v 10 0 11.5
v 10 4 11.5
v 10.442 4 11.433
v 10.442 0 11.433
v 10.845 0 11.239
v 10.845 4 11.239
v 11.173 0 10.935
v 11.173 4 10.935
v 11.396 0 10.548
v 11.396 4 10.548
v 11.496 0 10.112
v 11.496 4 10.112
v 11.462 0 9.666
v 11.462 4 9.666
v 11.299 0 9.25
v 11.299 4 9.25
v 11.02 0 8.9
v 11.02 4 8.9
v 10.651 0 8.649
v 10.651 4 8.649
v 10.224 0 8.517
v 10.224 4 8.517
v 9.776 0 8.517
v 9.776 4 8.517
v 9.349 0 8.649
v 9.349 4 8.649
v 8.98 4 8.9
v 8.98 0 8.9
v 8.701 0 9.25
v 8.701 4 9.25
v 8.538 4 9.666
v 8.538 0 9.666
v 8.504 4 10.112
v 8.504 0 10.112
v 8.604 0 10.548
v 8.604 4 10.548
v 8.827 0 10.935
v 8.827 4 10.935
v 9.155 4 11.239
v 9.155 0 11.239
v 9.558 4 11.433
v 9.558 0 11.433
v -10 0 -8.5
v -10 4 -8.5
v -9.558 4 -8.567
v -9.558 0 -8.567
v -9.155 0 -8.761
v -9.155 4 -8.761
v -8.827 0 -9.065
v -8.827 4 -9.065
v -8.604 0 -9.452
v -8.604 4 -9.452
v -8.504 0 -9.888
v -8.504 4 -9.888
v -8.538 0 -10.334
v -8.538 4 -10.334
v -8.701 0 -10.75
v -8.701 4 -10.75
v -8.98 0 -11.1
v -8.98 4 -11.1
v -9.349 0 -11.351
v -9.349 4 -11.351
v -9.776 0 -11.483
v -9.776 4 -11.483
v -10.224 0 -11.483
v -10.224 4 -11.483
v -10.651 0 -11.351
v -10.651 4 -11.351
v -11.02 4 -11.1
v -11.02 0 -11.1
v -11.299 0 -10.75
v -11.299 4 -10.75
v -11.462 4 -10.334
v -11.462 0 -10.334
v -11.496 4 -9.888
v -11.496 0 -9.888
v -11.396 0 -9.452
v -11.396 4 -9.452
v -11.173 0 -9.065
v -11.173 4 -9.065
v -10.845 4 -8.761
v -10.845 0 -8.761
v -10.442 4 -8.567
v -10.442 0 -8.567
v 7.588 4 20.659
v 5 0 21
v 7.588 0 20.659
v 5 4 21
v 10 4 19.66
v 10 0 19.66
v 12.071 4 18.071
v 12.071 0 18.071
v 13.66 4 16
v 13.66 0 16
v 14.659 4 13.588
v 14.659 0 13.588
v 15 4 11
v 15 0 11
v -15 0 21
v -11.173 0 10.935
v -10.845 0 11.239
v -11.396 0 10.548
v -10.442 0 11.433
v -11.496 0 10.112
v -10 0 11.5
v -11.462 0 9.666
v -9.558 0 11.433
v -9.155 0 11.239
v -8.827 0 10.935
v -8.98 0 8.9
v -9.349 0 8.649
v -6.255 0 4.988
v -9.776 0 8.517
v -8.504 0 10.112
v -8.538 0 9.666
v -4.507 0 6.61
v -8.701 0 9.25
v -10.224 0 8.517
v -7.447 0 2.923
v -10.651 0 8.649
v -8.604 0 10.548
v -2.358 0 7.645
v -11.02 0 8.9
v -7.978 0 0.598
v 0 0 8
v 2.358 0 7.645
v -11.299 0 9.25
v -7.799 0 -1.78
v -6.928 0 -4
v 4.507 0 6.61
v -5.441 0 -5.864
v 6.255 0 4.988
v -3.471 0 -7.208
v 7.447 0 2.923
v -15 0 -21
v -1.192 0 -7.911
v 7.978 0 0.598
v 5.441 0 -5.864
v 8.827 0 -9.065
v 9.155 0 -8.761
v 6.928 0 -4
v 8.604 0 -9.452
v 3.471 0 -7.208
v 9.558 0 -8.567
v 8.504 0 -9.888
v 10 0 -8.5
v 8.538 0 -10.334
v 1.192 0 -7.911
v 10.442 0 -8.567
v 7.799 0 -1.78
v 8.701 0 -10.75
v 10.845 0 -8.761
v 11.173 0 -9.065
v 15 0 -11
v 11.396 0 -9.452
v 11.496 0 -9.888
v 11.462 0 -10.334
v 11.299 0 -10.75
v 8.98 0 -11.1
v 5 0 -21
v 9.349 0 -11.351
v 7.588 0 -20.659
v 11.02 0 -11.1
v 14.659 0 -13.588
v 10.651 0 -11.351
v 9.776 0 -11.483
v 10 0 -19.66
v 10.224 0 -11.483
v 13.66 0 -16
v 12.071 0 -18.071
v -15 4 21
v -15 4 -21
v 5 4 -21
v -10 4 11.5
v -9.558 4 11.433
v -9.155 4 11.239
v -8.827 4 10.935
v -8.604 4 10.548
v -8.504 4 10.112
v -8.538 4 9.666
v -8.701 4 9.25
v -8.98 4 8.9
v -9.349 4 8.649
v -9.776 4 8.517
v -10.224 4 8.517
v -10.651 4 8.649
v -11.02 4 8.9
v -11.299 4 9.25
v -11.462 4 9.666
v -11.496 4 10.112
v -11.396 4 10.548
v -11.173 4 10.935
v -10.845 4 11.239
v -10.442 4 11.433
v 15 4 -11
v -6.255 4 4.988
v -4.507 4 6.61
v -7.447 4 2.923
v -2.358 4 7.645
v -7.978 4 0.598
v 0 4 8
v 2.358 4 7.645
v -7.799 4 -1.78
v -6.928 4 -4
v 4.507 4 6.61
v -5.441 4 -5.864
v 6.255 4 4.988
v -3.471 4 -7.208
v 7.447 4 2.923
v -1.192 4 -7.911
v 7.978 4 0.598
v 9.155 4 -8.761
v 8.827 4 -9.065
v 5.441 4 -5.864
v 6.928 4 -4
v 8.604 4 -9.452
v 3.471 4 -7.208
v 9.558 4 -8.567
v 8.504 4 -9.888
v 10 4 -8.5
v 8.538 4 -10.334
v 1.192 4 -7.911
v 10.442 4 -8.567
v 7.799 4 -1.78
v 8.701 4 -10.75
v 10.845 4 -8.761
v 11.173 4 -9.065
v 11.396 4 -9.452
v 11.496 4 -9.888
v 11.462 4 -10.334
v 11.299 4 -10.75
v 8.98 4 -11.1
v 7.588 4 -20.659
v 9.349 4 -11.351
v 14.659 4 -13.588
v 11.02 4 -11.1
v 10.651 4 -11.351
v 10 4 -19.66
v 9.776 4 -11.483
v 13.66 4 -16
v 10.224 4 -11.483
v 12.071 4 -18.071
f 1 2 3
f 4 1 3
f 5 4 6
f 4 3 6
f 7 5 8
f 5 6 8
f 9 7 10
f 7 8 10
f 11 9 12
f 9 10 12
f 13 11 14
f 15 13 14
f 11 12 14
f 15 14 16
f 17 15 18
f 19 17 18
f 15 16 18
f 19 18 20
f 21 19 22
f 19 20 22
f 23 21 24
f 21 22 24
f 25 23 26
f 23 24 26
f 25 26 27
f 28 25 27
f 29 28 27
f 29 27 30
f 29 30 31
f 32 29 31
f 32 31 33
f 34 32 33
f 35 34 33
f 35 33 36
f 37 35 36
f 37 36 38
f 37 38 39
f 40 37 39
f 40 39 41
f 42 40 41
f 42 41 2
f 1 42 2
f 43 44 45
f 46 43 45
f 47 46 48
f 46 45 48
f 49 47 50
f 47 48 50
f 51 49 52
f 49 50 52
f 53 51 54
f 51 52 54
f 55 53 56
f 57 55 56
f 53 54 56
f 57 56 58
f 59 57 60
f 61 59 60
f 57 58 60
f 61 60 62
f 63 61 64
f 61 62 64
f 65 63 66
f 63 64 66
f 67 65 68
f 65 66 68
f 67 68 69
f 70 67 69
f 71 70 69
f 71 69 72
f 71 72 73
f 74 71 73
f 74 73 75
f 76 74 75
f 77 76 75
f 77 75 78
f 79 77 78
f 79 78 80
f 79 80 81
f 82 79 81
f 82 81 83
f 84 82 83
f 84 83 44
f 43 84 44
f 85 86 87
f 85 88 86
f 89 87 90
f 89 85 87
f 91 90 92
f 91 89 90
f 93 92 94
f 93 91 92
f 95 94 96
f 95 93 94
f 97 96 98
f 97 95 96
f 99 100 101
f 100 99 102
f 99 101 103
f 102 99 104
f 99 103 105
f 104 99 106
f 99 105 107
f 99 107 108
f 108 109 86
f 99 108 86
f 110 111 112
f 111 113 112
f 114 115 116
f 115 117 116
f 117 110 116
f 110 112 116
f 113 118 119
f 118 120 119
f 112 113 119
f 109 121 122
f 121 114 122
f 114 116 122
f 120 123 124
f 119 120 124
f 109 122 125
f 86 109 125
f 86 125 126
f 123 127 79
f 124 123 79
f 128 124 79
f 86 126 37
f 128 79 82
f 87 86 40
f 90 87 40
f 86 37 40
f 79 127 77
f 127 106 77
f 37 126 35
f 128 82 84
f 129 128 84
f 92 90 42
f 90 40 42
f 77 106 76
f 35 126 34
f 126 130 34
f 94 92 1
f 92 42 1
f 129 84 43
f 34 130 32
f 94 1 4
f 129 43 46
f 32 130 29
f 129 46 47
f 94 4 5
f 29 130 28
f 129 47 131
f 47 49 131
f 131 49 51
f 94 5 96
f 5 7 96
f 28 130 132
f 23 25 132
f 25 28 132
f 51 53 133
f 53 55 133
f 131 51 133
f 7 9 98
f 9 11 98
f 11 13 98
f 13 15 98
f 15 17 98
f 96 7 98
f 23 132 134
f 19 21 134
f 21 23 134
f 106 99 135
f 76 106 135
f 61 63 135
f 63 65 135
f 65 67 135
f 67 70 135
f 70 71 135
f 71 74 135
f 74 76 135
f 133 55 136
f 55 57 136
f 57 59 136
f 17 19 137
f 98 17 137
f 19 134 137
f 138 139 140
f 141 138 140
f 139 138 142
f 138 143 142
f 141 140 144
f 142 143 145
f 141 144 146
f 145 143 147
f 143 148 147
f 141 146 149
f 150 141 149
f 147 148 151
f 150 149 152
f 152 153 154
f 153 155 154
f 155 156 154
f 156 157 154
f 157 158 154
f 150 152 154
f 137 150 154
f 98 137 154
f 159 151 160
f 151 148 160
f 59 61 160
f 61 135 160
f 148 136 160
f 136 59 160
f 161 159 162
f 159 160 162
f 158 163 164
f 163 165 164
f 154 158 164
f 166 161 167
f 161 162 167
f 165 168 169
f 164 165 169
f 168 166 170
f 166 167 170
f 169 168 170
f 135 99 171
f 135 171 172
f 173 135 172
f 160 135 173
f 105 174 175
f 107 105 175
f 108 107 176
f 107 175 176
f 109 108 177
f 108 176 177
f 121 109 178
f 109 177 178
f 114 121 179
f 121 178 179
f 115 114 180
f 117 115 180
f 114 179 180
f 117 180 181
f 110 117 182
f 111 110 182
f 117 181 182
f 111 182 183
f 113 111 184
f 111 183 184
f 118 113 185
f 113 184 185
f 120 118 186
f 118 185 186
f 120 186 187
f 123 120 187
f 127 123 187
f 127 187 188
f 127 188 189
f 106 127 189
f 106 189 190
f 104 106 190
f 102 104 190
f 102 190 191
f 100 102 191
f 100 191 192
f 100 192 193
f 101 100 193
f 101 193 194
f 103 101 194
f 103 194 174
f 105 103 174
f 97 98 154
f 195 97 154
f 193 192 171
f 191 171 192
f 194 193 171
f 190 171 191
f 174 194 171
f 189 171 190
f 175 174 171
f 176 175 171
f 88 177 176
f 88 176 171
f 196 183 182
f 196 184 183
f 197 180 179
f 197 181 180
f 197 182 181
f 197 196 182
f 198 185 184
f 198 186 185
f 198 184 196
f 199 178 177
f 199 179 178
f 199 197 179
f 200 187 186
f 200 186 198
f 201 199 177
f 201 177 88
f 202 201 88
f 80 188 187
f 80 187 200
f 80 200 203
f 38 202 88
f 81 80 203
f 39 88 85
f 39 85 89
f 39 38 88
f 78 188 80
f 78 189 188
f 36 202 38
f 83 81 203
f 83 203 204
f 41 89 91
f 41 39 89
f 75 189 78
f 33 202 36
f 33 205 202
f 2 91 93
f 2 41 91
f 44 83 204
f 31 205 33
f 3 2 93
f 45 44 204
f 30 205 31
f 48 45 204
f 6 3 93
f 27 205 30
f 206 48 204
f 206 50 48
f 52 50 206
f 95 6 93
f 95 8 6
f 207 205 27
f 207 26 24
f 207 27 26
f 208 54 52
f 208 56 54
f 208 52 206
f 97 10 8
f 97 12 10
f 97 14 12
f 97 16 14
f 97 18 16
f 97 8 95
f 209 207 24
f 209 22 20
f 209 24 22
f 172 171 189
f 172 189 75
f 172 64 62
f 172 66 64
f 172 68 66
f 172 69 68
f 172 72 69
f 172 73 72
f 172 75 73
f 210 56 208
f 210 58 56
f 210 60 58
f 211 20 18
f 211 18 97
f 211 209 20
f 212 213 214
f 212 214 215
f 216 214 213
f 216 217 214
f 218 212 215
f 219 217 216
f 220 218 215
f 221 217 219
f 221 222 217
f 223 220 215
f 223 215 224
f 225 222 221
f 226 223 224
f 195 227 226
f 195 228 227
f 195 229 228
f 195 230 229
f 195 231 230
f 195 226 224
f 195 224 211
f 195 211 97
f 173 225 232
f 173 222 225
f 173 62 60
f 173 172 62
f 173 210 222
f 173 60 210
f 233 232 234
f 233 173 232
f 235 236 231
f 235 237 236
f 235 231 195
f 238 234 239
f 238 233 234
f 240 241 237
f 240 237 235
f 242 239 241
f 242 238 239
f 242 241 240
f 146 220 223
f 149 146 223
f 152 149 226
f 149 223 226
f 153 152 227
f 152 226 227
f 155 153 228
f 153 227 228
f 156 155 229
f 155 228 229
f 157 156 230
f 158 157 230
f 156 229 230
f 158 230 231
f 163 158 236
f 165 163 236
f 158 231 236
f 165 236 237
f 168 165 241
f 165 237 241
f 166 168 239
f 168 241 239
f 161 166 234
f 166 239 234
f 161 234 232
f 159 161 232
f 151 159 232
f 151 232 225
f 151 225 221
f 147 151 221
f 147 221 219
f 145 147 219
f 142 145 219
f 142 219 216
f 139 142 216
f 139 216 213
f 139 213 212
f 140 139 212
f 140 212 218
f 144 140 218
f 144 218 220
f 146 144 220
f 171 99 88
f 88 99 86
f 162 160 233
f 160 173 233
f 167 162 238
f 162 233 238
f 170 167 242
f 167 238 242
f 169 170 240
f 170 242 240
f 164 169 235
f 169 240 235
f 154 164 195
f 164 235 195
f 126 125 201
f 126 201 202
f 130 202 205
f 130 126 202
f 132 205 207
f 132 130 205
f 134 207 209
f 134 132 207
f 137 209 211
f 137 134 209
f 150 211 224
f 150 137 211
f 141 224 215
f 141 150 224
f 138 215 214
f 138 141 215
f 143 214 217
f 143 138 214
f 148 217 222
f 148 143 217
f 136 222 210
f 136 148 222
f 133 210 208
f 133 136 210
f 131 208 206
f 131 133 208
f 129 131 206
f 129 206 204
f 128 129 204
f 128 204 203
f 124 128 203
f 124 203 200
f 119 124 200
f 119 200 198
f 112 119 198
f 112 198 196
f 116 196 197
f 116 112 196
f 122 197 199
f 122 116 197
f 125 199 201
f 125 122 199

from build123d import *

# Parameters (mm, degrees)
SKETCH2_W           = 30
SKETCH2_H           = 42
SKETCH2_R           = 8
BOSS_EXTRUDE1_DEPTH = 4
FILLET1_R           = 10
SKETCH3_R           = 1.5
CUT_EXTRUDE1_DEPTH  = 6


with BuildPart() as part:
    # Sketch2 → Boss-Extrude1 (new body)
    with BuildSketch(Plane(origin=(0, 0, 0), x_dir=(1, 0, 0), z_dir=(0, 1, 0))):
        Rectangle(SKETCH2_W, SKETCH2_H)
        with Locations(Location((0, 0, 0), (0, 0, 270))):
            Circle(SKETCH2_R, mode=Mode.SUBTRACT)
    extrude(amount=BOSS_EXTRUDE1_DEPTH)

    # Fillet1
    fillet1_edges = [part.edges().sort_by_distance(p)[0] for p in [
        (15, 2, 21),
        (15, 2, -21),
    ]]
    fillet(fillet1_edges, radius=FILLET1_R)

    # Sketch3 → Cut-Extrude1 (cut)
    with BuildSketch(Plane(origin=(0, 4, 0), x_dir=(1, 0, 0), z_dir=(0, 1, 0))):
        with Locations(Location((-10, 10, 0), (0, 0, 270))):
            Circle(SKETCH3_R)
        with Locations(Location((10, 10, 0), (0, 0, 270))):
            Circle(SKETCH3_R)
        with Locations(Location((10, -10, 0), (0, 0, 270))):
            Circle(SKETCH3_R)
        with Locations(Location((-10, -10, 0), (0, 0, 270))):
            Circle(SKETCH3_R)
    extrude(amount=-CUT_EXTRUDE1_DEPTH, mode=Mode.SUBTRACT)


solid = part.part
